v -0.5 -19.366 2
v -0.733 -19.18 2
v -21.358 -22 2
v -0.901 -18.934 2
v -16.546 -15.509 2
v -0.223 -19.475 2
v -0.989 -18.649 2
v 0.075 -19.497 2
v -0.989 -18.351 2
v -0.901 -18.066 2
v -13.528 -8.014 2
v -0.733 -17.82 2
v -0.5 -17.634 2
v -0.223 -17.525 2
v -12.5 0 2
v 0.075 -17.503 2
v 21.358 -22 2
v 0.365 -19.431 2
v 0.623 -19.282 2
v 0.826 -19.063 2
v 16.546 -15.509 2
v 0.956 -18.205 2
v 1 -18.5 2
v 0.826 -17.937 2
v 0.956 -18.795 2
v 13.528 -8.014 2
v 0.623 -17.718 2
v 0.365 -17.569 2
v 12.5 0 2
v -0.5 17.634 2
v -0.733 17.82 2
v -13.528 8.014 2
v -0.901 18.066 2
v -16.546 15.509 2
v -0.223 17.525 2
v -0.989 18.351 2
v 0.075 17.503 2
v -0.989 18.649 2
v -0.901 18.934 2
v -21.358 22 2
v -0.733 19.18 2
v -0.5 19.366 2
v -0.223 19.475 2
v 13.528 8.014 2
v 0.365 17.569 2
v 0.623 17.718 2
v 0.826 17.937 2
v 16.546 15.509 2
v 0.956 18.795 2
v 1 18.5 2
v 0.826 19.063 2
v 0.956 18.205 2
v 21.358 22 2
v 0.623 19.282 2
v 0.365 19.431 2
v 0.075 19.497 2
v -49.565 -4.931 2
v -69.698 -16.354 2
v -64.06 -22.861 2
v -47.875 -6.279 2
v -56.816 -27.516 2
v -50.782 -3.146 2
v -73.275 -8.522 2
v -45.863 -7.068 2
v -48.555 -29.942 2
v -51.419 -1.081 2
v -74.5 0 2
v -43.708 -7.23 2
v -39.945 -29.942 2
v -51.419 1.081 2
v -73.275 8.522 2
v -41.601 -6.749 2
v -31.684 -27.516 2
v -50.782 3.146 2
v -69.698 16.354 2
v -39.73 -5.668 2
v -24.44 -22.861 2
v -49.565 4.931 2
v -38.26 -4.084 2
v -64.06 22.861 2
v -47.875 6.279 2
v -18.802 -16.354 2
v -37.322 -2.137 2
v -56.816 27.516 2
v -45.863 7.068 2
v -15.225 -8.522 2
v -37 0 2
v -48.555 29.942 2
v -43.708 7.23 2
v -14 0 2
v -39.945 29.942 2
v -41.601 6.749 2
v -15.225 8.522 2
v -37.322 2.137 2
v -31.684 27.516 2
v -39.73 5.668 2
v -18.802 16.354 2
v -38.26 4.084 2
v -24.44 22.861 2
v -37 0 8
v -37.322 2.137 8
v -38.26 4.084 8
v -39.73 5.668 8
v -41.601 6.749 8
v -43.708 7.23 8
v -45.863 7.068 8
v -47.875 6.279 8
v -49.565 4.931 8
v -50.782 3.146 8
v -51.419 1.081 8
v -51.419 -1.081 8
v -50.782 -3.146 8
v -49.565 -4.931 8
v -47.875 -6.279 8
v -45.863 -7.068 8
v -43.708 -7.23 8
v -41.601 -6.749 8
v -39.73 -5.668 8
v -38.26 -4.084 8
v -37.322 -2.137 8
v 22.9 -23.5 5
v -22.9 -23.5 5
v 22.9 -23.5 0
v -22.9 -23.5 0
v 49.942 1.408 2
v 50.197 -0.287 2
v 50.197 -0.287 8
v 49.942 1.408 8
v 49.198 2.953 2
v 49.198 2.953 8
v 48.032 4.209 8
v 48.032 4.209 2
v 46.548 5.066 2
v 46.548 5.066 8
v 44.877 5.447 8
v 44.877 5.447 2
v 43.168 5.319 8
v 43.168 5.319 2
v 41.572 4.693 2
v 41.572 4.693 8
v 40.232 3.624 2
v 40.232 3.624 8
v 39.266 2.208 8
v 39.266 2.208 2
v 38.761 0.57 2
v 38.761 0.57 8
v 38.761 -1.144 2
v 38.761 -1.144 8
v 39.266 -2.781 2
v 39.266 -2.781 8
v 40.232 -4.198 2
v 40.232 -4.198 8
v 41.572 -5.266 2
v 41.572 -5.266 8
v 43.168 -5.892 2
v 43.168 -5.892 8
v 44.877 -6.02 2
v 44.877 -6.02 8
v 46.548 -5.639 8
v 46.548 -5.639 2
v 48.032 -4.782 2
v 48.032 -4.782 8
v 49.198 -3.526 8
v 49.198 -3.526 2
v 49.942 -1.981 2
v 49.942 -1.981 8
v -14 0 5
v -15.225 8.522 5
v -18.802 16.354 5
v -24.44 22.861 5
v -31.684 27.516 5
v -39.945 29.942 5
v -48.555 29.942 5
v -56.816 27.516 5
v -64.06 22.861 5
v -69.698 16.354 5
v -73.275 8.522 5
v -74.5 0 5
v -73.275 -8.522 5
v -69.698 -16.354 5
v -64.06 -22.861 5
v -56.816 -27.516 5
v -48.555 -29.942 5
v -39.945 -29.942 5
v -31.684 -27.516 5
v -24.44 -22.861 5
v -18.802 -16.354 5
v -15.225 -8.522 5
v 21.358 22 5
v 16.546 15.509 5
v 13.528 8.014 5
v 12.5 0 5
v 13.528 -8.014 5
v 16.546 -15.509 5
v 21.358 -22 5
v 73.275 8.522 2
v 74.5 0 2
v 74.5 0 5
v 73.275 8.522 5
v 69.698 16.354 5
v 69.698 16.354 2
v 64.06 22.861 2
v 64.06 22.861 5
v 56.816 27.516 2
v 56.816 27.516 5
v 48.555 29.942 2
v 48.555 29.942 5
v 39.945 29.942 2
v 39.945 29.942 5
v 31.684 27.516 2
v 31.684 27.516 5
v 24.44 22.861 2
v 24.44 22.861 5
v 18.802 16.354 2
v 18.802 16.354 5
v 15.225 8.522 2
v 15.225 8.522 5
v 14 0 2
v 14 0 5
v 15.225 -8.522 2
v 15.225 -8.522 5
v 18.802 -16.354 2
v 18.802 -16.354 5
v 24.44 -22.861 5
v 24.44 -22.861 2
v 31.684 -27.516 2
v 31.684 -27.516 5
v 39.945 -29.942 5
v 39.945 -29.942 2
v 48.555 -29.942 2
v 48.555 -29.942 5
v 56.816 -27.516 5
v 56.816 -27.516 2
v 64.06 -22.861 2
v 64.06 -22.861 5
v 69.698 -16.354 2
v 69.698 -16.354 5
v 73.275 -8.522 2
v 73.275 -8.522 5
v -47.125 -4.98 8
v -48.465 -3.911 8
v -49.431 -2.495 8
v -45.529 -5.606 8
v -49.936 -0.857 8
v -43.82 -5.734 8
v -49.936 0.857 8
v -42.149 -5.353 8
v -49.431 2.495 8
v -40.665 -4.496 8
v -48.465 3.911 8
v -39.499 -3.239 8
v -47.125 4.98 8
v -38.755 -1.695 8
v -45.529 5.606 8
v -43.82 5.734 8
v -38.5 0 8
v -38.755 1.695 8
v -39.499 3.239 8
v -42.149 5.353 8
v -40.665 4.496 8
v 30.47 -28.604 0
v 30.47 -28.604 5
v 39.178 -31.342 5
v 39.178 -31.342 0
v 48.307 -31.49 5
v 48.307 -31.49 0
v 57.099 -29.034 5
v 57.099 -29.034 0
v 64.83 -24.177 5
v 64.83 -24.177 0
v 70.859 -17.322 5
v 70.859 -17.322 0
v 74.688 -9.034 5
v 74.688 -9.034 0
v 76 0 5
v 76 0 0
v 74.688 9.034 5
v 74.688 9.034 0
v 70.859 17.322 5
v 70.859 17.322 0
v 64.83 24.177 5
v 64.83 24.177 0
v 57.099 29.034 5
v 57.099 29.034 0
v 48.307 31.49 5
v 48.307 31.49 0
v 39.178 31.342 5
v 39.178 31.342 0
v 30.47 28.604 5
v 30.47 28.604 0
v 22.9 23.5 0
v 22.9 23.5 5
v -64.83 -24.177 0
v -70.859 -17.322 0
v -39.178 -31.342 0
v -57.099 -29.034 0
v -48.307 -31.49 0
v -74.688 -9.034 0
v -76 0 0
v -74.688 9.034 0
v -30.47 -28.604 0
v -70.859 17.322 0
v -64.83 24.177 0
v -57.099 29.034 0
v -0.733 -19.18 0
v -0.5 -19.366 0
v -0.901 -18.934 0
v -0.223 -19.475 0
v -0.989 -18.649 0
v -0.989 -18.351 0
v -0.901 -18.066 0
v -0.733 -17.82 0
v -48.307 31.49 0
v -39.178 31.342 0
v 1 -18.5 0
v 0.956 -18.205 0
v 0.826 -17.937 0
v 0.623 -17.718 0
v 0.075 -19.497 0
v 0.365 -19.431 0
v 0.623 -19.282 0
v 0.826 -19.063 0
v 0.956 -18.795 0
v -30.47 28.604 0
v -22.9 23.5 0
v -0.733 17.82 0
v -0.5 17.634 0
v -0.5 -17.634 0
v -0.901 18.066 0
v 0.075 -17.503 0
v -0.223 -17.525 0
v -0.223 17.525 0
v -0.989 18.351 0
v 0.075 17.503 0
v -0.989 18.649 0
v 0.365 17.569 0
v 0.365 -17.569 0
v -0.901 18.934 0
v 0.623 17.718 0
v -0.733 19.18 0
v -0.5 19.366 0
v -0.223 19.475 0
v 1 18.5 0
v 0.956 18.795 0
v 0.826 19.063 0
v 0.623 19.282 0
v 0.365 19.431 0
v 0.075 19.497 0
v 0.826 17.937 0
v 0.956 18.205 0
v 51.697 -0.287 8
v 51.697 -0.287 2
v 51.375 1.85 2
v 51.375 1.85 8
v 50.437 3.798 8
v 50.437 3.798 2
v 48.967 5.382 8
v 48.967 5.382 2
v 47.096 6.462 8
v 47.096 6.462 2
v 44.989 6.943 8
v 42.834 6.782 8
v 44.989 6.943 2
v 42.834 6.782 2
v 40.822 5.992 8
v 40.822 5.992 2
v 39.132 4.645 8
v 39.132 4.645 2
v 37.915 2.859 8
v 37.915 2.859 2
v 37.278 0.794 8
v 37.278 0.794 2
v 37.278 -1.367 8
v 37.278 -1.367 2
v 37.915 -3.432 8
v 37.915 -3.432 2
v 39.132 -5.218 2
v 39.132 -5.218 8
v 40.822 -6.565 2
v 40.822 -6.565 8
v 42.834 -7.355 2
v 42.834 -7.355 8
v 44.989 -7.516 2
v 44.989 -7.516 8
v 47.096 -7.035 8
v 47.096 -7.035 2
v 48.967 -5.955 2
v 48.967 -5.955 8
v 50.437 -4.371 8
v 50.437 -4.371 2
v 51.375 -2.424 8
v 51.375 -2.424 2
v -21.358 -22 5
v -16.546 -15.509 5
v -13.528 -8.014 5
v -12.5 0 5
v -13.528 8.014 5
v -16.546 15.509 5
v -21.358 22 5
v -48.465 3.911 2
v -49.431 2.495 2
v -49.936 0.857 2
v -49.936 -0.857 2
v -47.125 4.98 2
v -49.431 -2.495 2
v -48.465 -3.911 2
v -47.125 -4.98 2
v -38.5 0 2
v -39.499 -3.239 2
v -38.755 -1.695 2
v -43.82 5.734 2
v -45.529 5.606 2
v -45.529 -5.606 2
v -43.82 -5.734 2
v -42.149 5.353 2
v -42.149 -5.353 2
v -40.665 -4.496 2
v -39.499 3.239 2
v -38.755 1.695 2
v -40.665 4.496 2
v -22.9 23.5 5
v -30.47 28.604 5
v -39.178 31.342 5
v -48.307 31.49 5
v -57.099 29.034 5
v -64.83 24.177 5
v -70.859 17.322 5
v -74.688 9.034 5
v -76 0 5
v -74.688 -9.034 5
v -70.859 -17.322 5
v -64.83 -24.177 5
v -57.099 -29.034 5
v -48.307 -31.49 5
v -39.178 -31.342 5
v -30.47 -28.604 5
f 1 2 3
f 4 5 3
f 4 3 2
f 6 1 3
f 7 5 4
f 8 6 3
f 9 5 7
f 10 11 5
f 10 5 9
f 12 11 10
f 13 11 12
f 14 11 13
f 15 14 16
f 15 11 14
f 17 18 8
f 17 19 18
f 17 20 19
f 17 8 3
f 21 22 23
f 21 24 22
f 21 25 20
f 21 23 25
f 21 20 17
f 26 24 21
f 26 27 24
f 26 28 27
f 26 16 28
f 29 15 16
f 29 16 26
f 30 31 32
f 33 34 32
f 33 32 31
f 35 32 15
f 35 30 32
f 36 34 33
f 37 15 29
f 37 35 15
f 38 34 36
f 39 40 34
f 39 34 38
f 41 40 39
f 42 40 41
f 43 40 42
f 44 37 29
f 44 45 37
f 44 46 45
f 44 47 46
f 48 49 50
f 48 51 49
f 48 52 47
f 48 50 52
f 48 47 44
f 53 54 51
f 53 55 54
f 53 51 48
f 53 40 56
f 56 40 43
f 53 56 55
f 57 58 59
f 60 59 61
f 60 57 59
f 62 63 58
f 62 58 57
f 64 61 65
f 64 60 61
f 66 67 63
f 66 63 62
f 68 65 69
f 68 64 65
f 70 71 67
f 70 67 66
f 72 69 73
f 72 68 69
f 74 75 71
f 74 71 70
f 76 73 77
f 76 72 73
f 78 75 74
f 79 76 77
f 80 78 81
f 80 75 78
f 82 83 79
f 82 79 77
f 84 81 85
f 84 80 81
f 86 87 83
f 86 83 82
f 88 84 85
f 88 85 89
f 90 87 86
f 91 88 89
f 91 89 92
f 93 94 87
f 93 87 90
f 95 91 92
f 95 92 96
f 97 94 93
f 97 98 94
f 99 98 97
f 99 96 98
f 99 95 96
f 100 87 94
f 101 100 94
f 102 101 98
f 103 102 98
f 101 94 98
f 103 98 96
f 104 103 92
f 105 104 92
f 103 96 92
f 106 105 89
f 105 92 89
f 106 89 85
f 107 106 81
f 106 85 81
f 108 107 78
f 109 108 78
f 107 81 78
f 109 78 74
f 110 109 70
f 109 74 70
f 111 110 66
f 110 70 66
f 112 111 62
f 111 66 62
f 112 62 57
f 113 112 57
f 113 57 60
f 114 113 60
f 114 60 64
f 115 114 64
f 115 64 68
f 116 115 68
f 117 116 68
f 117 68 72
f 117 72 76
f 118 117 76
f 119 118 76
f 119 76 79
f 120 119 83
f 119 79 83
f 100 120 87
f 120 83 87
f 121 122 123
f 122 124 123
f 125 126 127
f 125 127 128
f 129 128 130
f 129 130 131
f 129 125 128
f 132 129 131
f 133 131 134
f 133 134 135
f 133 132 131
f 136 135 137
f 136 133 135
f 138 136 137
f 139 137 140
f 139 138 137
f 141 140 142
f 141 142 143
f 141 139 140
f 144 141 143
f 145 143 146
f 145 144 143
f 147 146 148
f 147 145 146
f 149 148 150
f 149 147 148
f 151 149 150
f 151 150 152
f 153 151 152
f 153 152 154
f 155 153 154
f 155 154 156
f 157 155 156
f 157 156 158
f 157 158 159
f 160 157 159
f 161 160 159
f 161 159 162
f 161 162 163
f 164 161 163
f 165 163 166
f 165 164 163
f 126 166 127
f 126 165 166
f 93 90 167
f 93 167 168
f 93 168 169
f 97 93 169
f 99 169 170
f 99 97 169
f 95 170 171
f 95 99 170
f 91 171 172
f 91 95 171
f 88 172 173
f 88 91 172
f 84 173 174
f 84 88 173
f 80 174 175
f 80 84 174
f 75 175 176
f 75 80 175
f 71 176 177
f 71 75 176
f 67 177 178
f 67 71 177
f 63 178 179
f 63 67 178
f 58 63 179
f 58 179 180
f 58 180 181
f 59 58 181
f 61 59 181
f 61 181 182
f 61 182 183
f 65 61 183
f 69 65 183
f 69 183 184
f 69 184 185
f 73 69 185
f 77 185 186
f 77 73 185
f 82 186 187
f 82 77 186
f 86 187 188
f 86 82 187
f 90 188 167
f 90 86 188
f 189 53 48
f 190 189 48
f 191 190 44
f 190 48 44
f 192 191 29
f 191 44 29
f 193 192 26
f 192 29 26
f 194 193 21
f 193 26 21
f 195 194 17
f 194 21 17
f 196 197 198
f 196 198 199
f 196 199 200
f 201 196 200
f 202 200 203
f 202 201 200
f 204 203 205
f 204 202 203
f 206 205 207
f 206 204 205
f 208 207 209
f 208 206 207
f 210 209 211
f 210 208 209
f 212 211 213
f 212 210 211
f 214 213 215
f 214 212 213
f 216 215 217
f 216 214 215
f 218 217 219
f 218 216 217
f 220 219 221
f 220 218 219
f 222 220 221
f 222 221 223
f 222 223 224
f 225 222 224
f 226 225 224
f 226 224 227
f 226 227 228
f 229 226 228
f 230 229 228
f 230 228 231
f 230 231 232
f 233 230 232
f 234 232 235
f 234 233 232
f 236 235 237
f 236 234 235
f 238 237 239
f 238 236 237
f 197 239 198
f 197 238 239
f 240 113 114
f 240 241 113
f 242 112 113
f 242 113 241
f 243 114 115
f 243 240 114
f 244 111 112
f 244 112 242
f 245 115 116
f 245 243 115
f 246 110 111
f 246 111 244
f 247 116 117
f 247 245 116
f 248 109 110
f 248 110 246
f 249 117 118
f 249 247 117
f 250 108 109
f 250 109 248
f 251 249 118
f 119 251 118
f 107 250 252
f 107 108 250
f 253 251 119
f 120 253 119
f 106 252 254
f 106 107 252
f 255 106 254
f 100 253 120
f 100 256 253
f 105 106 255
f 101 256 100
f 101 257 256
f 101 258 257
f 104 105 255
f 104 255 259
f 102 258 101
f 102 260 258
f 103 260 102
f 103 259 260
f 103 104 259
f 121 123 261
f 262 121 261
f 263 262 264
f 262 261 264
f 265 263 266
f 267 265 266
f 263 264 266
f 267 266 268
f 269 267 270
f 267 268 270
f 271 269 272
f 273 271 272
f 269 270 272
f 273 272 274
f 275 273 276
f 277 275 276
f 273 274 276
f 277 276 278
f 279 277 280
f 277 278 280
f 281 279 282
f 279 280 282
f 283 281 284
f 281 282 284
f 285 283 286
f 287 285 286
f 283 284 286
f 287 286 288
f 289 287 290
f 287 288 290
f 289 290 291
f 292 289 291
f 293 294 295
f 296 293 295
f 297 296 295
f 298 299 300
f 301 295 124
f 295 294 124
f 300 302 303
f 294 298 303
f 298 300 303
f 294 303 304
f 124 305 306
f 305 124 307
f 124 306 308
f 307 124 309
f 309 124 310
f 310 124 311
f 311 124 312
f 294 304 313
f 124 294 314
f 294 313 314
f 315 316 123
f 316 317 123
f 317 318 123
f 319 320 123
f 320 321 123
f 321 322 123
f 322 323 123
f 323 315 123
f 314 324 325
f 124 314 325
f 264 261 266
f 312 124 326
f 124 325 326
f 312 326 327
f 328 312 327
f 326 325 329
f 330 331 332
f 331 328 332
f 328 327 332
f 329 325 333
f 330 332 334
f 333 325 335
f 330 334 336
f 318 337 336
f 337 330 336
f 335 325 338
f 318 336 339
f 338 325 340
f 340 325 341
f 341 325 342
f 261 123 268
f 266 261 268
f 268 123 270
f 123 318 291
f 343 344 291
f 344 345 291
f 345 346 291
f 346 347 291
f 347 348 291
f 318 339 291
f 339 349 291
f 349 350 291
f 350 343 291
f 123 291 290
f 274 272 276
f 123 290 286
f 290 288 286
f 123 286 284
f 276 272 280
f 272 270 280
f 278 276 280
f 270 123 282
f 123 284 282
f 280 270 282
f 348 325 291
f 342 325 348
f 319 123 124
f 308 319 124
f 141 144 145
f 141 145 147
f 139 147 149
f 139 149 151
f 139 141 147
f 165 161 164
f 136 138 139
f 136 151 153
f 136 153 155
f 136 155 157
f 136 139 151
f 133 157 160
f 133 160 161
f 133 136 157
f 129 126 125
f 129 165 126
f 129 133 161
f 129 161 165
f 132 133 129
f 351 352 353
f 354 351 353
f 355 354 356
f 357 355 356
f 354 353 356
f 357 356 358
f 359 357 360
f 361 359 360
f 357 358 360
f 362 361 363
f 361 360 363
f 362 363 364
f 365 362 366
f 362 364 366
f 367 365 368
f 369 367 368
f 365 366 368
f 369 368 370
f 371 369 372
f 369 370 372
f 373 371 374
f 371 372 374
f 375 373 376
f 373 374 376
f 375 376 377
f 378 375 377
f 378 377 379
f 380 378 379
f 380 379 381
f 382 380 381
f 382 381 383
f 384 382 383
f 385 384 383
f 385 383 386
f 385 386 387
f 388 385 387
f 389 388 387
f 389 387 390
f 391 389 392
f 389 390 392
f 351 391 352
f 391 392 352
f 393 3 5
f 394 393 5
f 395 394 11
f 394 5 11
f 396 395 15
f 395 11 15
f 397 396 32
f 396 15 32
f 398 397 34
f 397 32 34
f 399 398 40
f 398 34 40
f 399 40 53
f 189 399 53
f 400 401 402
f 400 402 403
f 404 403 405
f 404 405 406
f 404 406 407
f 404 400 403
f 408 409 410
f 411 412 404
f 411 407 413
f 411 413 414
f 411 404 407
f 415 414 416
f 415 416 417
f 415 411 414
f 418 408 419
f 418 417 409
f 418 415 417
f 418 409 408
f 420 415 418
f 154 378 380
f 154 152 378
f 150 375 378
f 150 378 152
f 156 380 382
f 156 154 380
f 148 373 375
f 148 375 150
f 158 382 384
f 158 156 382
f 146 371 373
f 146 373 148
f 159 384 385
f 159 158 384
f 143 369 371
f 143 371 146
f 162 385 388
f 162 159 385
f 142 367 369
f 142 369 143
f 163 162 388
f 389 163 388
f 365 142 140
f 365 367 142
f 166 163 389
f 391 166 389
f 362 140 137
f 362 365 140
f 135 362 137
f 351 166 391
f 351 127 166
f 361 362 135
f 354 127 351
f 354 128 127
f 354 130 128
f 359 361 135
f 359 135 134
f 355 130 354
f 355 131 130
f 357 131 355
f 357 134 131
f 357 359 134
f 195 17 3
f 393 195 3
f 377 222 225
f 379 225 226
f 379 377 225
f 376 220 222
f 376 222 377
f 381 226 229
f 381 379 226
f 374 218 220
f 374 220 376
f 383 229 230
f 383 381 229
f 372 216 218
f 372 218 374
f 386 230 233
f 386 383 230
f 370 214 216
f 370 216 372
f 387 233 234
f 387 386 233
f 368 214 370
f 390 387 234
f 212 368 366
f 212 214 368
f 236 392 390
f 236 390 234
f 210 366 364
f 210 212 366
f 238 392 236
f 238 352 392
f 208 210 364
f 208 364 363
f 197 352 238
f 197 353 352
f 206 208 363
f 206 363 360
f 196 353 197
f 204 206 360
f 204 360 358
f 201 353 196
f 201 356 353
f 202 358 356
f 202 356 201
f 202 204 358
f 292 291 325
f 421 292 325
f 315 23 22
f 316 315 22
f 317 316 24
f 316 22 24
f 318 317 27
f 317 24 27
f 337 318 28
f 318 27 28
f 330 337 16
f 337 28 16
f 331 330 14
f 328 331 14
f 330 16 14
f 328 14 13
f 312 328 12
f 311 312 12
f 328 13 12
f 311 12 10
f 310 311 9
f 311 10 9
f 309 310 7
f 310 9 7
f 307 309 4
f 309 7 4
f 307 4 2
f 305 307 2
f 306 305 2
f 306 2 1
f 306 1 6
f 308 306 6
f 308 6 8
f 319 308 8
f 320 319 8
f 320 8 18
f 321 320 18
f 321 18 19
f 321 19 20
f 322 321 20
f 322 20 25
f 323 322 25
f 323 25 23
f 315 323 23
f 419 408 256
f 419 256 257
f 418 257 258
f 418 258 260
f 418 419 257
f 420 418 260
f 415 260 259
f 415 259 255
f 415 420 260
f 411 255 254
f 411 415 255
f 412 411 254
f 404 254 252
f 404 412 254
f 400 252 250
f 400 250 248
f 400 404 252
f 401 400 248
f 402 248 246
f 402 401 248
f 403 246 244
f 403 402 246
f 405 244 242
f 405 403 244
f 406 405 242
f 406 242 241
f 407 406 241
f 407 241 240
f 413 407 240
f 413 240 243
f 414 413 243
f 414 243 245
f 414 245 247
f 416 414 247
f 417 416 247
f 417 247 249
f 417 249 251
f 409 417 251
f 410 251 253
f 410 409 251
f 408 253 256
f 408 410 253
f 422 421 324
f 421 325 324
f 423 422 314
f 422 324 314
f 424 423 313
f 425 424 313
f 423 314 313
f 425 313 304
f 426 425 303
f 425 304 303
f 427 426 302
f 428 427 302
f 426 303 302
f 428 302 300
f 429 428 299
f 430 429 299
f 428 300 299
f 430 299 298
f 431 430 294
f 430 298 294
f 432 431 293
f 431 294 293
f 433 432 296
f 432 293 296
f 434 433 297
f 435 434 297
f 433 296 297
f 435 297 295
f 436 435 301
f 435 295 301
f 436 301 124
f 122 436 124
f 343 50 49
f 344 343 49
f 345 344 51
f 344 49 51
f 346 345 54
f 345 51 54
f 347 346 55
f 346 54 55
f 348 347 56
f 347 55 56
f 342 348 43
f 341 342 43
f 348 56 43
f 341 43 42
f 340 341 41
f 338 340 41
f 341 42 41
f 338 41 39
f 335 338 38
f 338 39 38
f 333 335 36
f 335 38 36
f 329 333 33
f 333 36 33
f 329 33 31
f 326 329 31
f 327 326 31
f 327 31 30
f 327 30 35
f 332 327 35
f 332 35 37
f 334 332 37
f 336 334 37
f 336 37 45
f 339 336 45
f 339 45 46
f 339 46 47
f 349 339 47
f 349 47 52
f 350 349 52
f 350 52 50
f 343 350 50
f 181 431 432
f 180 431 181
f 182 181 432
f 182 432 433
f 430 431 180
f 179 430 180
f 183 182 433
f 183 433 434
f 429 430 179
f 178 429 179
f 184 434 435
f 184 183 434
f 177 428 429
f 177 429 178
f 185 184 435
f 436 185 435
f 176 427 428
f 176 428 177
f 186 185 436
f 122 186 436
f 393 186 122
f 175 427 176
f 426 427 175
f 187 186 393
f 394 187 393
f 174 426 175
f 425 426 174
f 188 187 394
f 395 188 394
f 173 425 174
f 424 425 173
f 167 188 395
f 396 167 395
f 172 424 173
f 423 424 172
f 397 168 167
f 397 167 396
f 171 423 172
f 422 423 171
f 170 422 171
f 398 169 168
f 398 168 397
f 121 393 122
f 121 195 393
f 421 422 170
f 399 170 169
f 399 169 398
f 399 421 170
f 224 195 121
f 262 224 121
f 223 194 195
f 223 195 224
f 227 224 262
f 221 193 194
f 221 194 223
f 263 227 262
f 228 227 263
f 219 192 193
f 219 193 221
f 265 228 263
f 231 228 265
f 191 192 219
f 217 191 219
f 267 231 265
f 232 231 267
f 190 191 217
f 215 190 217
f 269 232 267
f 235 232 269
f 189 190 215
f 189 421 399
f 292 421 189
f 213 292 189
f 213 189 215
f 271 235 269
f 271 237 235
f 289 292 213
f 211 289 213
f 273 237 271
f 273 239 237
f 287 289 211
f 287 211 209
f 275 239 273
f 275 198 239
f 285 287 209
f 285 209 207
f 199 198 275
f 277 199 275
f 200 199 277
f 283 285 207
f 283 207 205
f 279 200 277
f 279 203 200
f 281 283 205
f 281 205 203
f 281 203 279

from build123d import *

# Parameters (mm, degrees)
BOSS_EXTRUDE1_DEPTH     = 2
SKETCH5_R               = 30.25
BOSS_EXTRUDE2_DEPTH     = 3
SKETCH6_R               = 7.25
SKETCH6_R_2             = 5.75
BOSS_EXTRUDE3_DEPTH     = 6
SKETCH7_R               = 1
CUT_EXTRUDE1_DEPTH      = 10
CUT_EXTRUDE1_DEPTH_BACK = 3


with BuildPart() as part:
    # Sketch3 → Boss-Extrude1 (new body)
    with BuildSketch(Plane.XY):
        with BuildLine():
            Line((22.900234193, 23.5), (-22.900234193, 23.5))
            ThreePointArc((-22.900234193, 23.5), (-76, 0), (-22.900234193, -23.5))
            Line((-22.900234193, -23.5), (22.900234193, -23.5))
            ThreePointArc((22.900234193, -23.5), (76, 0), (22.900234193, 23.5))
        make_face()
    extrude(amount=BOSS_EXTRUDE1_DEPTH)

    # Sketch5 → Boss-Extrude2 (add)
    with BuildSketch(Plane.XY.offset(2)):
        with BuildLine():
            Line((22.900234193, 23.5), (-22.900234193, 23.5))
            ThreePointArc((-22.900234193, 23.5), (-76, 0), (-22.900234193, -23.5))
            Line((-22.900234193, -23.5), (22.900234193, -23.5))
            ThreePointArc((22.900234193, -23.5), (76, 0), (22.900234193, 23.5))
        make_face()
        with Locations((-44.25, 0)):
            Circle(SKETCH5_R, mode=Mode.SUBTRACT)
        with Locations((44.25, 0)):
            Circle(SKETCH5_R, mode=Mode.SUBTRACT)
        with BuildLine():
            Line((-21.357588594, 22), (21.357588594, 22))
            ThreePointArc((21.357588594, 22), (12.5, 0), (21.357588594, -22))
            Line((21.357588594, -22), (-21.357588594, -22))
            ThreePointArc((-21.357588594, -22), (-12.5, 0), (-21.357588594, 22))
        make_face(mode=Mode.SUBTRACT)
    extrude(amount=BOSS_EXTRUDE2_DEPTH)

    # Sketch6 → Boss-Extrude3 (add)
    with BuildSketch(Plane.XY.offset(2)):
        with Locations((-44.25, 0)):
            Circle(SKETCH6_R)
        with Locations((-44.25, 0)):
            Circle(SKETCH6_R_2, mode=Mode.SUBTRACT)
        with Locations((44.447055655, -0.28653356)):
            Circle(SKETCH6_R)
        with Locations((44.447055655, -0.28653356)):
            Circle(SKETCH6_R_2, mode=Mode.SUBTRACT)
    extrude(amount=BOSS_EXTRUDE3_DEPTH)

    # Sketch7 → Cut-Extrude1 (cut, two sides)
    with BuildSketch(Plane.XY.offset(2)) as cut_extrude1_sk:
        with Locations((0, 18.5)):
            Circle(SKETCH7_R)
        with Locations((0, -18.5)):
            Circle(SKETCH7_R)
    extrude(amount=CUT_EXTRUDE1_DEPTH, mode=Mode.SUBTRACT)
    extrude(cut_extrude1_sk.sketch, amount=-CUT_EXTRUDE1_DEPTH_BACK, mode=Mode.SUBTRACT)


solid = part.part
